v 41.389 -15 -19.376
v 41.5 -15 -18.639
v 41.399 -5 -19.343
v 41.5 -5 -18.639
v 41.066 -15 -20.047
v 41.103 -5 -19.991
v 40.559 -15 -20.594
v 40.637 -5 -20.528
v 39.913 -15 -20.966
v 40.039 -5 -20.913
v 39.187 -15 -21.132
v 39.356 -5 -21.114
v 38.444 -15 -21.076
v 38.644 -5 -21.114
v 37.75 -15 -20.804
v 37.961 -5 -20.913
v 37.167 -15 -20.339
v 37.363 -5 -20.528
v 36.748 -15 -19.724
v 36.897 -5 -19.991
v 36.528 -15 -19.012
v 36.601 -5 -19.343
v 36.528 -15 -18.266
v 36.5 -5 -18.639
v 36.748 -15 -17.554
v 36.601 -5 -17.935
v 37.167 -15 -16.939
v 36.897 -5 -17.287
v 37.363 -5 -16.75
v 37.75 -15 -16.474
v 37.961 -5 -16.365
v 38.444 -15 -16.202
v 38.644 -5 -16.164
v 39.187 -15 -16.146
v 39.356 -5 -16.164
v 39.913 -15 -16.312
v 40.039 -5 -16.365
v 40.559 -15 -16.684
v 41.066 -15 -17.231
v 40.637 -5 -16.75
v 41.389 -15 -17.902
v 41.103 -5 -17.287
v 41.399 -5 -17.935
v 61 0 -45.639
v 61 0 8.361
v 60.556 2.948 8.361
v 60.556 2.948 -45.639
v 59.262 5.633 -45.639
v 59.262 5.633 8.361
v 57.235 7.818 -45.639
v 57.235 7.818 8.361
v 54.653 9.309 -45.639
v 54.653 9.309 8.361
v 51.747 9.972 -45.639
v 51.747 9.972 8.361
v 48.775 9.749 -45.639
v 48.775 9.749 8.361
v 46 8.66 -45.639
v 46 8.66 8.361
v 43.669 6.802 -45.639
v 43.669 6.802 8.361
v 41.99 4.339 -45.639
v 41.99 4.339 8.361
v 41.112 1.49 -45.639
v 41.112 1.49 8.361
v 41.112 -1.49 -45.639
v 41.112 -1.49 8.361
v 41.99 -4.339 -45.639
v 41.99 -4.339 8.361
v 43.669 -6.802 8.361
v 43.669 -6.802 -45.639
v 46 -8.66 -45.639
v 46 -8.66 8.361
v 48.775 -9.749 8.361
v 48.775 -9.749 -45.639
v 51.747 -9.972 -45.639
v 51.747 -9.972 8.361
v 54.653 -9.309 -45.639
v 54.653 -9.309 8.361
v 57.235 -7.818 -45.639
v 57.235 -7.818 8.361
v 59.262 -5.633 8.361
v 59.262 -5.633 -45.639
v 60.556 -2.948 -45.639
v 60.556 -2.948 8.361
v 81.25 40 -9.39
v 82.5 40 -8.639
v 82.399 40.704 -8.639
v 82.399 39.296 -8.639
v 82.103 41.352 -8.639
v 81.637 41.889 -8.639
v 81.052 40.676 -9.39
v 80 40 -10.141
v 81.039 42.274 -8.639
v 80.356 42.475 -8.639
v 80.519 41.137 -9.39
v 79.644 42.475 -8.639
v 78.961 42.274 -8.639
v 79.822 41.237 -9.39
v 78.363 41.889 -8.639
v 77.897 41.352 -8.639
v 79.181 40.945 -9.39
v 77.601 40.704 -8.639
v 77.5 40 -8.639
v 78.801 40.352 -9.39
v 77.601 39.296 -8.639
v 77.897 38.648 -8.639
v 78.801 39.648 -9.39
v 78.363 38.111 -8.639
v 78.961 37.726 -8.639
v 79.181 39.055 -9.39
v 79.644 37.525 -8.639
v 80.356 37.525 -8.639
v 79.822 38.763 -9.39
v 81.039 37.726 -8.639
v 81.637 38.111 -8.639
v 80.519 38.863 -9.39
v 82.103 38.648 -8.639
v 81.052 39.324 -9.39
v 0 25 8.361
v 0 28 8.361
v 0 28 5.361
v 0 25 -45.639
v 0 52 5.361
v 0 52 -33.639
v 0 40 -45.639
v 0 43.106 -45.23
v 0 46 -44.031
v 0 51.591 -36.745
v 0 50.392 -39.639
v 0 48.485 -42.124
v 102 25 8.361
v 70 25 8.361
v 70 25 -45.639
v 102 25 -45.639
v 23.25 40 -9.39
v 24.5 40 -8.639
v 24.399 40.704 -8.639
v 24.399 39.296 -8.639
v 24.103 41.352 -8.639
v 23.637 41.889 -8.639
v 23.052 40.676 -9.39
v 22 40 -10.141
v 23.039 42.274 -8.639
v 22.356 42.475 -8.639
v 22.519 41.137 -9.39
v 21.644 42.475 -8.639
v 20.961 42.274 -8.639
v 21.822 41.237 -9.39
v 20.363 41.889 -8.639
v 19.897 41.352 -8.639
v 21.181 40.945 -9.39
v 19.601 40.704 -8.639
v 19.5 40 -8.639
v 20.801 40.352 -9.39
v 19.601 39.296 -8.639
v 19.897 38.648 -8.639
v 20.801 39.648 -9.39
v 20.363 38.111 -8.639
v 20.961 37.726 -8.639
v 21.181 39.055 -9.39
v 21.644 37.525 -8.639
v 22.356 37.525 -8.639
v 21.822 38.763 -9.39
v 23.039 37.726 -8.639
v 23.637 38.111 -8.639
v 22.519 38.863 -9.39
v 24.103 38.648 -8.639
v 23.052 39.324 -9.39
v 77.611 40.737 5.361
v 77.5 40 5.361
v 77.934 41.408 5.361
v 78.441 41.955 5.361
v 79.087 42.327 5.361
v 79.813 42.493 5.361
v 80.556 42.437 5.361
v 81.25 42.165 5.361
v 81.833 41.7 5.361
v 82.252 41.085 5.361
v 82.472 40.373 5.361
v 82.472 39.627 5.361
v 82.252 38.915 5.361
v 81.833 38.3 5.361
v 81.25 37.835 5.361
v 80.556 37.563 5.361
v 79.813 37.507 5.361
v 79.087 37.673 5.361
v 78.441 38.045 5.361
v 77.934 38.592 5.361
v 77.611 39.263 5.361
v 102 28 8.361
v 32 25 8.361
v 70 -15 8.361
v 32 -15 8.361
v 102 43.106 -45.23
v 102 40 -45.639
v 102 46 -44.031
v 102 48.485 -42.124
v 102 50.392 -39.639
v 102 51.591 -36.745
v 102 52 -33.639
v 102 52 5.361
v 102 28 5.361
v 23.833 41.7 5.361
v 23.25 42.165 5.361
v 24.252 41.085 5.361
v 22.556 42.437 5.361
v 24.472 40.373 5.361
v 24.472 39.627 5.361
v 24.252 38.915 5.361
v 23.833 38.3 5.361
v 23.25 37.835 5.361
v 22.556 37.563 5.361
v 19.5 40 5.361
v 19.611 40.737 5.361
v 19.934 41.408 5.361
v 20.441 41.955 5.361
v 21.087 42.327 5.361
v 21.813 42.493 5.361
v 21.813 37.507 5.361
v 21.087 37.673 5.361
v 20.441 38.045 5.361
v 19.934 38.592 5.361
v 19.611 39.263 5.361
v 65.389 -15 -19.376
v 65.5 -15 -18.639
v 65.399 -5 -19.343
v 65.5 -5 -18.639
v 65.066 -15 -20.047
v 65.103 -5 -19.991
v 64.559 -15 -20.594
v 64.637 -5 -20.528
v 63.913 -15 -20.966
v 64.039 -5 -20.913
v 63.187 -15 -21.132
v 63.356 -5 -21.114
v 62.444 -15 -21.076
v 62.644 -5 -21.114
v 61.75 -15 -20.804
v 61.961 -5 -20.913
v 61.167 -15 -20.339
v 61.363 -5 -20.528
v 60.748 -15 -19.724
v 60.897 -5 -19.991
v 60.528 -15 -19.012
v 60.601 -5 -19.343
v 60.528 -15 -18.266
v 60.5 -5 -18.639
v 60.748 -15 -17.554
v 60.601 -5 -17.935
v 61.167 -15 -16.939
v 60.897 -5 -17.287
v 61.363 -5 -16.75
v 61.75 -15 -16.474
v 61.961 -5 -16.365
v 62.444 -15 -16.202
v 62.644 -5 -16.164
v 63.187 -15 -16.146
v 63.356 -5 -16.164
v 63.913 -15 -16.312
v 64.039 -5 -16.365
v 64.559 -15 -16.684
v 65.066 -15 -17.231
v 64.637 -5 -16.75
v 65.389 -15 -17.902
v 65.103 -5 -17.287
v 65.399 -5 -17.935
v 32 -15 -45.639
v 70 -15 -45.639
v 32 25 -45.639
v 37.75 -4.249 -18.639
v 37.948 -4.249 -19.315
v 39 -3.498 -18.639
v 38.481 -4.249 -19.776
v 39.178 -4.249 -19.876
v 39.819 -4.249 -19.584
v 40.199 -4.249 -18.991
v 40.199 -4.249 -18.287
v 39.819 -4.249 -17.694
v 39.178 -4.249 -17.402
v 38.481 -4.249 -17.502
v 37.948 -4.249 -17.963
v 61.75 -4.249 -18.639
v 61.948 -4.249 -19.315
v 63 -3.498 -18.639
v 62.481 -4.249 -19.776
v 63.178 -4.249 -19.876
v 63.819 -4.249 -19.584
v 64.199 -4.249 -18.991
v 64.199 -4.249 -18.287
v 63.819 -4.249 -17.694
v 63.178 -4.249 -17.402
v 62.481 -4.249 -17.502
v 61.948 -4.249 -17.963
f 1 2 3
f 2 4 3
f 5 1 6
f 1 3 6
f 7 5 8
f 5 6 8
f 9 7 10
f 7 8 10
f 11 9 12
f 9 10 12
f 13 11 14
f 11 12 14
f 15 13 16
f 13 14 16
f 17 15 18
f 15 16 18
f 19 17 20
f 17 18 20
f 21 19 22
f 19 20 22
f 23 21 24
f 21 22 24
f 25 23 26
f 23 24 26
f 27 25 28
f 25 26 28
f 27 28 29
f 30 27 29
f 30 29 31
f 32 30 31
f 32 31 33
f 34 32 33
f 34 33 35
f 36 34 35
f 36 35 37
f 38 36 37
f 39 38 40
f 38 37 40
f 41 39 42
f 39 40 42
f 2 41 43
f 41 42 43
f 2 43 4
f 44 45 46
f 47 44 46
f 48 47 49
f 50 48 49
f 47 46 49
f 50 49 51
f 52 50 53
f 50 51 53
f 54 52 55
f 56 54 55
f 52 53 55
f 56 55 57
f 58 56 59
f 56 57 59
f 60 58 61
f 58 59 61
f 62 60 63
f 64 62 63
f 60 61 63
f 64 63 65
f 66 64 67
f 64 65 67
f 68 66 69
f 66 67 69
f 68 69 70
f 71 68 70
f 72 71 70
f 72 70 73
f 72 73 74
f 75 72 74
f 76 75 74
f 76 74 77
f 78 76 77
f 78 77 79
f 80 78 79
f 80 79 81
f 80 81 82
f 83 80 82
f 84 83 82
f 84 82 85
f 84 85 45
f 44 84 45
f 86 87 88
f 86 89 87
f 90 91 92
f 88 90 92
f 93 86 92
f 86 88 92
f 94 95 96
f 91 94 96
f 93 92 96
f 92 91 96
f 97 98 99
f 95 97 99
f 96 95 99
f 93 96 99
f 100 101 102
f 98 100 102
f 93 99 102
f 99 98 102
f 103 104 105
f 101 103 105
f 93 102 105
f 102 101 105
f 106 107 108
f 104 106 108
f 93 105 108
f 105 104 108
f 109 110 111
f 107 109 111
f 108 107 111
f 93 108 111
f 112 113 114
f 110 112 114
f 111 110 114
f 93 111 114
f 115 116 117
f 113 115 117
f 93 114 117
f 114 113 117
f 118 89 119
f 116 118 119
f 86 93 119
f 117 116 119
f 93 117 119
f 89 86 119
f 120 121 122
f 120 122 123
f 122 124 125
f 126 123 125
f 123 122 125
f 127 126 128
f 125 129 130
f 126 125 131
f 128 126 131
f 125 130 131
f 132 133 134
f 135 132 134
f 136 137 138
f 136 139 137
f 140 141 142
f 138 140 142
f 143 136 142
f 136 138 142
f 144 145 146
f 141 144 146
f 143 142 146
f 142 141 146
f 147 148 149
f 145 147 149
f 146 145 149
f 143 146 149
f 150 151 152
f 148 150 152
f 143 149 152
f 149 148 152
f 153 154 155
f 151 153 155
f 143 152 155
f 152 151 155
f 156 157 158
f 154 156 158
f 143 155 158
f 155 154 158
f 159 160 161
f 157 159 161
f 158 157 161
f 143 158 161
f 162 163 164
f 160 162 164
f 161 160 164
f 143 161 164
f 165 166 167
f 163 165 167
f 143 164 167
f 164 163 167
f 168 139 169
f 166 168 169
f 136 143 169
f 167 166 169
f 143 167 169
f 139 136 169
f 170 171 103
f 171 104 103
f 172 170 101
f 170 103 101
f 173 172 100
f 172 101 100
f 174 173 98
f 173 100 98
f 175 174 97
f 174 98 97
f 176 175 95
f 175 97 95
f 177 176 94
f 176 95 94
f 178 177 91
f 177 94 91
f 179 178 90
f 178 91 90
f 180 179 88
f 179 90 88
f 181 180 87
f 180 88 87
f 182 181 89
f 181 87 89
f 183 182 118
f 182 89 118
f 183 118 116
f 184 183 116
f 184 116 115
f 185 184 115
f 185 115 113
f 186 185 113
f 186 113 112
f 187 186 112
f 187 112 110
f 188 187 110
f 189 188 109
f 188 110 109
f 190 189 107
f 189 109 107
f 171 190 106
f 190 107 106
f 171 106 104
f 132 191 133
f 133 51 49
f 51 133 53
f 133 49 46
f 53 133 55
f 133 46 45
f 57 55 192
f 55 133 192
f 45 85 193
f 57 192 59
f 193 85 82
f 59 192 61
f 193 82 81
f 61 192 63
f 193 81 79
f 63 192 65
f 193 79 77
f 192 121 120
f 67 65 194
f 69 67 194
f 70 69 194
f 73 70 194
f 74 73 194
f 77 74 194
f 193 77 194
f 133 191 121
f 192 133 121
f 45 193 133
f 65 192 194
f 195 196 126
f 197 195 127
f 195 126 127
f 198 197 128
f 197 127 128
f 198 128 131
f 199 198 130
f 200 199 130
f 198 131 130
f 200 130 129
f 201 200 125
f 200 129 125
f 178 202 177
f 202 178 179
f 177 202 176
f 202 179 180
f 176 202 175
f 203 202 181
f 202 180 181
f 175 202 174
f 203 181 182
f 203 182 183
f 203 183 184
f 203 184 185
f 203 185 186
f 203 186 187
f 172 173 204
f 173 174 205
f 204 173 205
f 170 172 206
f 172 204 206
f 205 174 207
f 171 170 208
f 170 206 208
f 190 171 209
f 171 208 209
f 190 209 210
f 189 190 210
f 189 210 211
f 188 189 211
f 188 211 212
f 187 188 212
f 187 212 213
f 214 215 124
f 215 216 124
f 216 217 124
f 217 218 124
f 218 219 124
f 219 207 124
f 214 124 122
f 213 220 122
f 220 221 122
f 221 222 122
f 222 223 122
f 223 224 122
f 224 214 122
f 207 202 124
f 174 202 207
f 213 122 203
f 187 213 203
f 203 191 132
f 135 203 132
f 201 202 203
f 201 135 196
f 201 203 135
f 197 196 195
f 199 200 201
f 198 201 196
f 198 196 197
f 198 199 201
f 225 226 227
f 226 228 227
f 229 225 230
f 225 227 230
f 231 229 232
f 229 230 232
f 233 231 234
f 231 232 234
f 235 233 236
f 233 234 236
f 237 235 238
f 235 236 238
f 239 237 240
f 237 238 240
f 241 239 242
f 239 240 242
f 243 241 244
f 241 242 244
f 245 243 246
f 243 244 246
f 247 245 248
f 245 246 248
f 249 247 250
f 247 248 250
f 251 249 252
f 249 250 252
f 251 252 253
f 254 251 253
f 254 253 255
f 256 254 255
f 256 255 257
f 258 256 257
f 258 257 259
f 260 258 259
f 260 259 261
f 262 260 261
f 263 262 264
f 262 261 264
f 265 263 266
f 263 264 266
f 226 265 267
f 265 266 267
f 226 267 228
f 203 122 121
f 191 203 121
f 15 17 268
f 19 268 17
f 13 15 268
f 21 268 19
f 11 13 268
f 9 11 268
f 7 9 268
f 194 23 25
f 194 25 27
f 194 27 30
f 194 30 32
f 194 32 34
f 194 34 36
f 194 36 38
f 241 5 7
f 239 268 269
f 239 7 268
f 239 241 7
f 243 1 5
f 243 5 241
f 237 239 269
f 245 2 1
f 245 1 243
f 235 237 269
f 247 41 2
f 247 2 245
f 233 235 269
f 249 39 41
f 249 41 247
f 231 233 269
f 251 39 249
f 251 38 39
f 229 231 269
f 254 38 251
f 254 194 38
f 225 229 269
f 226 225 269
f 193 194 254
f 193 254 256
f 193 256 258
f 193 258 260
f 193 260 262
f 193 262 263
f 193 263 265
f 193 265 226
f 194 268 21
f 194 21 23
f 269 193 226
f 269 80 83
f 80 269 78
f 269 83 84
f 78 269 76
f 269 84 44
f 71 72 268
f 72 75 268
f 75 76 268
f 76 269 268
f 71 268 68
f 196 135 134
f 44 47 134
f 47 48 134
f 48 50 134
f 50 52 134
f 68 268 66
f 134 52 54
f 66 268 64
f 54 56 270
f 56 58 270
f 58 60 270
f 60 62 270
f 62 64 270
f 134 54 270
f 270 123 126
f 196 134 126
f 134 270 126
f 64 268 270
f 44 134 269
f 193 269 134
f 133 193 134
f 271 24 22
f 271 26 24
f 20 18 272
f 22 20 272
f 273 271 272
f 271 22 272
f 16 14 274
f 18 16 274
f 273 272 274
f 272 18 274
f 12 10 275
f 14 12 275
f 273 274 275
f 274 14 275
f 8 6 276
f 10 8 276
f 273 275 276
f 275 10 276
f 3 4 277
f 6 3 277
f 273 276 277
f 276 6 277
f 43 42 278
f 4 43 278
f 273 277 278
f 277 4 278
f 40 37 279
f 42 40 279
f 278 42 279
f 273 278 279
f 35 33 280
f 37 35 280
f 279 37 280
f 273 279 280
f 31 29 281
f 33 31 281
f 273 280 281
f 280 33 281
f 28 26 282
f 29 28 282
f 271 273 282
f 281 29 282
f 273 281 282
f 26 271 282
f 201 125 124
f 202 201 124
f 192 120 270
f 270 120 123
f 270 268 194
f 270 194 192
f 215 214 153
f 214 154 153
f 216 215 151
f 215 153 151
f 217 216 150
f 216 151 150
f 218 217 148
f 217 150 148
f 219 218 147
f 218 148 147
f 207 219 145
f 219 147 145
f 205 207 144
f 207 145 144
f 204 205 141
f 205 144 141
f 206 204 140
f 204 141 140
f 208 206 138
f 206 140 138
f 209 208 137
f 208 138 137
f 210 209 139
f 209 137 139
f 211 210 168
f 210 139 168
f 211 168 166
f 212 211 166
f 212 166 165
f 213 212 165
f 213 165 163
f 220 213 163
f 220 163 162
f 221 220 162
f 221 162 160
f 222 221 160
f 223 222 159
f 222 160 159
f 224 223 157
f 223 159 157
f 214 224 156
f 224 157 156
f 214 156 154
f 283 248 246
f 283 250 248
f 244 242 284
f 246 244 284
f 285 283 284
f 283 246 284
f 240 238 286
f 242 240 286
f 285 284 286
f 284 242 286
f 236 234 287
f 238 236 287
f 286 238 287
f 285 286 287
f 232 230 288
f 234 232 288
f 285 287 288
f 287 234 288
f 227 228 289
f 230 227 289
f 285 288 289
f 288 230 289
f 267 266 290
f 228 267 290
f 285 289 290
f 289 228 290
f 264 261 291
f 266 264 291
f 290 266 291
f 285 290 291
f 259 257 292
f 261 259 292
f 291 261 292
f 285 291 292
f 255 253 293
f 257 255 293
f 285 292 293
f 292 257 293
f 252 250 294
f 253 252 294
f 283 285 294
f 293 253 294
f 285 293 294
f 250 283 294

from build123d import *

# Parameters (mm, degrees)
EXTRUDE1_DEPTH        = 102
SKETCH3_W             = 38
SKETCH3_H             = 40
EXTRUDE3_DEPTH        = 54
SKETCH4_R             = 10
EXTRUDE4_DEPTH        = 127.585939188
M6_TAPPED_HOLE1_D     = 5
M6_TAPPED_HOLE1_DEPTH = 14
M6_TAPPED_HOLE1_TIP   = 1.502151548
M6_TAPPED_HOLE2_D     = 5
M6_TAPPED_HOLE2_DEPTH = 10
M6_TAPPED_HOLE2_TIP   = 1.502151548


with BuildPart() as part:
    # Sketch1 → Extrude1 (new body)
    with BuildSketch(Plane(origin=(0, 0, 0), x_dir=(0, 0, -1), z_dir=(1, 0, 0))):
        with BuildLine():
            Line((-5.361015491, 52), (-5.361015491, 28))
            Line((-5.361015491, 28), (-8.361015491, 28))
            Line((-8.361015491, 28), (-8.361015491, 25))
            Line((-8.361015491, 25), (45.638984509, 25))
            Line((45.638984509, 25), (45.638984509, 40))
            ThreePointArc((45.638984509, 40), (42.124265884, 48.485281374), (33.638984509, 52))
            Line((33.638984509, 52), (-5.361015491, 52))
        make_face()
    extrude(amount=EXTRUDE1_DEPTH)

    # Sketch3 → Extrude3 (add)
    with BuildSketch(Plane.XY.offset(8.361015491)):
        with Locations((51, 5)):
            Rectangle(SKETCH3_W, SKETCH3_H)
    extrude(amount=-EXTRUDE3_DEPTH)

    # Sketch4 → Extrude4 (cut, through all)
    with BuildSketch(Plane.XY.offset(8.361015491)):
        with Locations((51, 0)):
            Circle(SKETCH4_R)
    extrude(amount=-EXTRUDE4_DEPTH, mode=Mode.SUBTRACT)

    # M6 Tapped Hole1
    with Locations(Plane(origin=(22, 40, 5.361015491), x_dir=(1, 0, 0), z_dir=(0, 0, 1))):
        with Locations((0, 0), (58, 0)):
            Hole(M6_TAPPED_HOLE1_D / 2, depth=M6_TAPPED_HOLE1_DEPTH)
            with Locations((0, 0, -(M6_TAPPED_HOLE1_DEPTH + M6_TAPPED_HOLE1_TIP / 2))):  # 118° drill point
                Cone(0, M6_TAPPED_HOLE1_D / 2, M6_TAPPED_HOLE1_TIP, mode=Mode.SUBTRACT)

    # M6 Tapped Hole2
    with Locations(Plane(origin=(39, -15, -18.638984509), x_dir=(-1, 0, 0), z_dir=(0, -1, 0))):
        with Locations((0, 0), (-24, 0)):
            Hole(M6_TAPPED_HOLE2_D / 2, depth=M6_TAPPED_HOLE2_DEPTH)
            with Locations((0, 0, -(M6_TAPPED_HOLE2_DEPTH + M6_TAPPED_HOLE2_TIP / 2))):  # 118° drill point
                Cone(0, M6_TAPPED_HOLE2_D / 2, M6_TAPPED_HOLE2_TIP, mode=Mode.SUBTRACT)


solid = part.part
